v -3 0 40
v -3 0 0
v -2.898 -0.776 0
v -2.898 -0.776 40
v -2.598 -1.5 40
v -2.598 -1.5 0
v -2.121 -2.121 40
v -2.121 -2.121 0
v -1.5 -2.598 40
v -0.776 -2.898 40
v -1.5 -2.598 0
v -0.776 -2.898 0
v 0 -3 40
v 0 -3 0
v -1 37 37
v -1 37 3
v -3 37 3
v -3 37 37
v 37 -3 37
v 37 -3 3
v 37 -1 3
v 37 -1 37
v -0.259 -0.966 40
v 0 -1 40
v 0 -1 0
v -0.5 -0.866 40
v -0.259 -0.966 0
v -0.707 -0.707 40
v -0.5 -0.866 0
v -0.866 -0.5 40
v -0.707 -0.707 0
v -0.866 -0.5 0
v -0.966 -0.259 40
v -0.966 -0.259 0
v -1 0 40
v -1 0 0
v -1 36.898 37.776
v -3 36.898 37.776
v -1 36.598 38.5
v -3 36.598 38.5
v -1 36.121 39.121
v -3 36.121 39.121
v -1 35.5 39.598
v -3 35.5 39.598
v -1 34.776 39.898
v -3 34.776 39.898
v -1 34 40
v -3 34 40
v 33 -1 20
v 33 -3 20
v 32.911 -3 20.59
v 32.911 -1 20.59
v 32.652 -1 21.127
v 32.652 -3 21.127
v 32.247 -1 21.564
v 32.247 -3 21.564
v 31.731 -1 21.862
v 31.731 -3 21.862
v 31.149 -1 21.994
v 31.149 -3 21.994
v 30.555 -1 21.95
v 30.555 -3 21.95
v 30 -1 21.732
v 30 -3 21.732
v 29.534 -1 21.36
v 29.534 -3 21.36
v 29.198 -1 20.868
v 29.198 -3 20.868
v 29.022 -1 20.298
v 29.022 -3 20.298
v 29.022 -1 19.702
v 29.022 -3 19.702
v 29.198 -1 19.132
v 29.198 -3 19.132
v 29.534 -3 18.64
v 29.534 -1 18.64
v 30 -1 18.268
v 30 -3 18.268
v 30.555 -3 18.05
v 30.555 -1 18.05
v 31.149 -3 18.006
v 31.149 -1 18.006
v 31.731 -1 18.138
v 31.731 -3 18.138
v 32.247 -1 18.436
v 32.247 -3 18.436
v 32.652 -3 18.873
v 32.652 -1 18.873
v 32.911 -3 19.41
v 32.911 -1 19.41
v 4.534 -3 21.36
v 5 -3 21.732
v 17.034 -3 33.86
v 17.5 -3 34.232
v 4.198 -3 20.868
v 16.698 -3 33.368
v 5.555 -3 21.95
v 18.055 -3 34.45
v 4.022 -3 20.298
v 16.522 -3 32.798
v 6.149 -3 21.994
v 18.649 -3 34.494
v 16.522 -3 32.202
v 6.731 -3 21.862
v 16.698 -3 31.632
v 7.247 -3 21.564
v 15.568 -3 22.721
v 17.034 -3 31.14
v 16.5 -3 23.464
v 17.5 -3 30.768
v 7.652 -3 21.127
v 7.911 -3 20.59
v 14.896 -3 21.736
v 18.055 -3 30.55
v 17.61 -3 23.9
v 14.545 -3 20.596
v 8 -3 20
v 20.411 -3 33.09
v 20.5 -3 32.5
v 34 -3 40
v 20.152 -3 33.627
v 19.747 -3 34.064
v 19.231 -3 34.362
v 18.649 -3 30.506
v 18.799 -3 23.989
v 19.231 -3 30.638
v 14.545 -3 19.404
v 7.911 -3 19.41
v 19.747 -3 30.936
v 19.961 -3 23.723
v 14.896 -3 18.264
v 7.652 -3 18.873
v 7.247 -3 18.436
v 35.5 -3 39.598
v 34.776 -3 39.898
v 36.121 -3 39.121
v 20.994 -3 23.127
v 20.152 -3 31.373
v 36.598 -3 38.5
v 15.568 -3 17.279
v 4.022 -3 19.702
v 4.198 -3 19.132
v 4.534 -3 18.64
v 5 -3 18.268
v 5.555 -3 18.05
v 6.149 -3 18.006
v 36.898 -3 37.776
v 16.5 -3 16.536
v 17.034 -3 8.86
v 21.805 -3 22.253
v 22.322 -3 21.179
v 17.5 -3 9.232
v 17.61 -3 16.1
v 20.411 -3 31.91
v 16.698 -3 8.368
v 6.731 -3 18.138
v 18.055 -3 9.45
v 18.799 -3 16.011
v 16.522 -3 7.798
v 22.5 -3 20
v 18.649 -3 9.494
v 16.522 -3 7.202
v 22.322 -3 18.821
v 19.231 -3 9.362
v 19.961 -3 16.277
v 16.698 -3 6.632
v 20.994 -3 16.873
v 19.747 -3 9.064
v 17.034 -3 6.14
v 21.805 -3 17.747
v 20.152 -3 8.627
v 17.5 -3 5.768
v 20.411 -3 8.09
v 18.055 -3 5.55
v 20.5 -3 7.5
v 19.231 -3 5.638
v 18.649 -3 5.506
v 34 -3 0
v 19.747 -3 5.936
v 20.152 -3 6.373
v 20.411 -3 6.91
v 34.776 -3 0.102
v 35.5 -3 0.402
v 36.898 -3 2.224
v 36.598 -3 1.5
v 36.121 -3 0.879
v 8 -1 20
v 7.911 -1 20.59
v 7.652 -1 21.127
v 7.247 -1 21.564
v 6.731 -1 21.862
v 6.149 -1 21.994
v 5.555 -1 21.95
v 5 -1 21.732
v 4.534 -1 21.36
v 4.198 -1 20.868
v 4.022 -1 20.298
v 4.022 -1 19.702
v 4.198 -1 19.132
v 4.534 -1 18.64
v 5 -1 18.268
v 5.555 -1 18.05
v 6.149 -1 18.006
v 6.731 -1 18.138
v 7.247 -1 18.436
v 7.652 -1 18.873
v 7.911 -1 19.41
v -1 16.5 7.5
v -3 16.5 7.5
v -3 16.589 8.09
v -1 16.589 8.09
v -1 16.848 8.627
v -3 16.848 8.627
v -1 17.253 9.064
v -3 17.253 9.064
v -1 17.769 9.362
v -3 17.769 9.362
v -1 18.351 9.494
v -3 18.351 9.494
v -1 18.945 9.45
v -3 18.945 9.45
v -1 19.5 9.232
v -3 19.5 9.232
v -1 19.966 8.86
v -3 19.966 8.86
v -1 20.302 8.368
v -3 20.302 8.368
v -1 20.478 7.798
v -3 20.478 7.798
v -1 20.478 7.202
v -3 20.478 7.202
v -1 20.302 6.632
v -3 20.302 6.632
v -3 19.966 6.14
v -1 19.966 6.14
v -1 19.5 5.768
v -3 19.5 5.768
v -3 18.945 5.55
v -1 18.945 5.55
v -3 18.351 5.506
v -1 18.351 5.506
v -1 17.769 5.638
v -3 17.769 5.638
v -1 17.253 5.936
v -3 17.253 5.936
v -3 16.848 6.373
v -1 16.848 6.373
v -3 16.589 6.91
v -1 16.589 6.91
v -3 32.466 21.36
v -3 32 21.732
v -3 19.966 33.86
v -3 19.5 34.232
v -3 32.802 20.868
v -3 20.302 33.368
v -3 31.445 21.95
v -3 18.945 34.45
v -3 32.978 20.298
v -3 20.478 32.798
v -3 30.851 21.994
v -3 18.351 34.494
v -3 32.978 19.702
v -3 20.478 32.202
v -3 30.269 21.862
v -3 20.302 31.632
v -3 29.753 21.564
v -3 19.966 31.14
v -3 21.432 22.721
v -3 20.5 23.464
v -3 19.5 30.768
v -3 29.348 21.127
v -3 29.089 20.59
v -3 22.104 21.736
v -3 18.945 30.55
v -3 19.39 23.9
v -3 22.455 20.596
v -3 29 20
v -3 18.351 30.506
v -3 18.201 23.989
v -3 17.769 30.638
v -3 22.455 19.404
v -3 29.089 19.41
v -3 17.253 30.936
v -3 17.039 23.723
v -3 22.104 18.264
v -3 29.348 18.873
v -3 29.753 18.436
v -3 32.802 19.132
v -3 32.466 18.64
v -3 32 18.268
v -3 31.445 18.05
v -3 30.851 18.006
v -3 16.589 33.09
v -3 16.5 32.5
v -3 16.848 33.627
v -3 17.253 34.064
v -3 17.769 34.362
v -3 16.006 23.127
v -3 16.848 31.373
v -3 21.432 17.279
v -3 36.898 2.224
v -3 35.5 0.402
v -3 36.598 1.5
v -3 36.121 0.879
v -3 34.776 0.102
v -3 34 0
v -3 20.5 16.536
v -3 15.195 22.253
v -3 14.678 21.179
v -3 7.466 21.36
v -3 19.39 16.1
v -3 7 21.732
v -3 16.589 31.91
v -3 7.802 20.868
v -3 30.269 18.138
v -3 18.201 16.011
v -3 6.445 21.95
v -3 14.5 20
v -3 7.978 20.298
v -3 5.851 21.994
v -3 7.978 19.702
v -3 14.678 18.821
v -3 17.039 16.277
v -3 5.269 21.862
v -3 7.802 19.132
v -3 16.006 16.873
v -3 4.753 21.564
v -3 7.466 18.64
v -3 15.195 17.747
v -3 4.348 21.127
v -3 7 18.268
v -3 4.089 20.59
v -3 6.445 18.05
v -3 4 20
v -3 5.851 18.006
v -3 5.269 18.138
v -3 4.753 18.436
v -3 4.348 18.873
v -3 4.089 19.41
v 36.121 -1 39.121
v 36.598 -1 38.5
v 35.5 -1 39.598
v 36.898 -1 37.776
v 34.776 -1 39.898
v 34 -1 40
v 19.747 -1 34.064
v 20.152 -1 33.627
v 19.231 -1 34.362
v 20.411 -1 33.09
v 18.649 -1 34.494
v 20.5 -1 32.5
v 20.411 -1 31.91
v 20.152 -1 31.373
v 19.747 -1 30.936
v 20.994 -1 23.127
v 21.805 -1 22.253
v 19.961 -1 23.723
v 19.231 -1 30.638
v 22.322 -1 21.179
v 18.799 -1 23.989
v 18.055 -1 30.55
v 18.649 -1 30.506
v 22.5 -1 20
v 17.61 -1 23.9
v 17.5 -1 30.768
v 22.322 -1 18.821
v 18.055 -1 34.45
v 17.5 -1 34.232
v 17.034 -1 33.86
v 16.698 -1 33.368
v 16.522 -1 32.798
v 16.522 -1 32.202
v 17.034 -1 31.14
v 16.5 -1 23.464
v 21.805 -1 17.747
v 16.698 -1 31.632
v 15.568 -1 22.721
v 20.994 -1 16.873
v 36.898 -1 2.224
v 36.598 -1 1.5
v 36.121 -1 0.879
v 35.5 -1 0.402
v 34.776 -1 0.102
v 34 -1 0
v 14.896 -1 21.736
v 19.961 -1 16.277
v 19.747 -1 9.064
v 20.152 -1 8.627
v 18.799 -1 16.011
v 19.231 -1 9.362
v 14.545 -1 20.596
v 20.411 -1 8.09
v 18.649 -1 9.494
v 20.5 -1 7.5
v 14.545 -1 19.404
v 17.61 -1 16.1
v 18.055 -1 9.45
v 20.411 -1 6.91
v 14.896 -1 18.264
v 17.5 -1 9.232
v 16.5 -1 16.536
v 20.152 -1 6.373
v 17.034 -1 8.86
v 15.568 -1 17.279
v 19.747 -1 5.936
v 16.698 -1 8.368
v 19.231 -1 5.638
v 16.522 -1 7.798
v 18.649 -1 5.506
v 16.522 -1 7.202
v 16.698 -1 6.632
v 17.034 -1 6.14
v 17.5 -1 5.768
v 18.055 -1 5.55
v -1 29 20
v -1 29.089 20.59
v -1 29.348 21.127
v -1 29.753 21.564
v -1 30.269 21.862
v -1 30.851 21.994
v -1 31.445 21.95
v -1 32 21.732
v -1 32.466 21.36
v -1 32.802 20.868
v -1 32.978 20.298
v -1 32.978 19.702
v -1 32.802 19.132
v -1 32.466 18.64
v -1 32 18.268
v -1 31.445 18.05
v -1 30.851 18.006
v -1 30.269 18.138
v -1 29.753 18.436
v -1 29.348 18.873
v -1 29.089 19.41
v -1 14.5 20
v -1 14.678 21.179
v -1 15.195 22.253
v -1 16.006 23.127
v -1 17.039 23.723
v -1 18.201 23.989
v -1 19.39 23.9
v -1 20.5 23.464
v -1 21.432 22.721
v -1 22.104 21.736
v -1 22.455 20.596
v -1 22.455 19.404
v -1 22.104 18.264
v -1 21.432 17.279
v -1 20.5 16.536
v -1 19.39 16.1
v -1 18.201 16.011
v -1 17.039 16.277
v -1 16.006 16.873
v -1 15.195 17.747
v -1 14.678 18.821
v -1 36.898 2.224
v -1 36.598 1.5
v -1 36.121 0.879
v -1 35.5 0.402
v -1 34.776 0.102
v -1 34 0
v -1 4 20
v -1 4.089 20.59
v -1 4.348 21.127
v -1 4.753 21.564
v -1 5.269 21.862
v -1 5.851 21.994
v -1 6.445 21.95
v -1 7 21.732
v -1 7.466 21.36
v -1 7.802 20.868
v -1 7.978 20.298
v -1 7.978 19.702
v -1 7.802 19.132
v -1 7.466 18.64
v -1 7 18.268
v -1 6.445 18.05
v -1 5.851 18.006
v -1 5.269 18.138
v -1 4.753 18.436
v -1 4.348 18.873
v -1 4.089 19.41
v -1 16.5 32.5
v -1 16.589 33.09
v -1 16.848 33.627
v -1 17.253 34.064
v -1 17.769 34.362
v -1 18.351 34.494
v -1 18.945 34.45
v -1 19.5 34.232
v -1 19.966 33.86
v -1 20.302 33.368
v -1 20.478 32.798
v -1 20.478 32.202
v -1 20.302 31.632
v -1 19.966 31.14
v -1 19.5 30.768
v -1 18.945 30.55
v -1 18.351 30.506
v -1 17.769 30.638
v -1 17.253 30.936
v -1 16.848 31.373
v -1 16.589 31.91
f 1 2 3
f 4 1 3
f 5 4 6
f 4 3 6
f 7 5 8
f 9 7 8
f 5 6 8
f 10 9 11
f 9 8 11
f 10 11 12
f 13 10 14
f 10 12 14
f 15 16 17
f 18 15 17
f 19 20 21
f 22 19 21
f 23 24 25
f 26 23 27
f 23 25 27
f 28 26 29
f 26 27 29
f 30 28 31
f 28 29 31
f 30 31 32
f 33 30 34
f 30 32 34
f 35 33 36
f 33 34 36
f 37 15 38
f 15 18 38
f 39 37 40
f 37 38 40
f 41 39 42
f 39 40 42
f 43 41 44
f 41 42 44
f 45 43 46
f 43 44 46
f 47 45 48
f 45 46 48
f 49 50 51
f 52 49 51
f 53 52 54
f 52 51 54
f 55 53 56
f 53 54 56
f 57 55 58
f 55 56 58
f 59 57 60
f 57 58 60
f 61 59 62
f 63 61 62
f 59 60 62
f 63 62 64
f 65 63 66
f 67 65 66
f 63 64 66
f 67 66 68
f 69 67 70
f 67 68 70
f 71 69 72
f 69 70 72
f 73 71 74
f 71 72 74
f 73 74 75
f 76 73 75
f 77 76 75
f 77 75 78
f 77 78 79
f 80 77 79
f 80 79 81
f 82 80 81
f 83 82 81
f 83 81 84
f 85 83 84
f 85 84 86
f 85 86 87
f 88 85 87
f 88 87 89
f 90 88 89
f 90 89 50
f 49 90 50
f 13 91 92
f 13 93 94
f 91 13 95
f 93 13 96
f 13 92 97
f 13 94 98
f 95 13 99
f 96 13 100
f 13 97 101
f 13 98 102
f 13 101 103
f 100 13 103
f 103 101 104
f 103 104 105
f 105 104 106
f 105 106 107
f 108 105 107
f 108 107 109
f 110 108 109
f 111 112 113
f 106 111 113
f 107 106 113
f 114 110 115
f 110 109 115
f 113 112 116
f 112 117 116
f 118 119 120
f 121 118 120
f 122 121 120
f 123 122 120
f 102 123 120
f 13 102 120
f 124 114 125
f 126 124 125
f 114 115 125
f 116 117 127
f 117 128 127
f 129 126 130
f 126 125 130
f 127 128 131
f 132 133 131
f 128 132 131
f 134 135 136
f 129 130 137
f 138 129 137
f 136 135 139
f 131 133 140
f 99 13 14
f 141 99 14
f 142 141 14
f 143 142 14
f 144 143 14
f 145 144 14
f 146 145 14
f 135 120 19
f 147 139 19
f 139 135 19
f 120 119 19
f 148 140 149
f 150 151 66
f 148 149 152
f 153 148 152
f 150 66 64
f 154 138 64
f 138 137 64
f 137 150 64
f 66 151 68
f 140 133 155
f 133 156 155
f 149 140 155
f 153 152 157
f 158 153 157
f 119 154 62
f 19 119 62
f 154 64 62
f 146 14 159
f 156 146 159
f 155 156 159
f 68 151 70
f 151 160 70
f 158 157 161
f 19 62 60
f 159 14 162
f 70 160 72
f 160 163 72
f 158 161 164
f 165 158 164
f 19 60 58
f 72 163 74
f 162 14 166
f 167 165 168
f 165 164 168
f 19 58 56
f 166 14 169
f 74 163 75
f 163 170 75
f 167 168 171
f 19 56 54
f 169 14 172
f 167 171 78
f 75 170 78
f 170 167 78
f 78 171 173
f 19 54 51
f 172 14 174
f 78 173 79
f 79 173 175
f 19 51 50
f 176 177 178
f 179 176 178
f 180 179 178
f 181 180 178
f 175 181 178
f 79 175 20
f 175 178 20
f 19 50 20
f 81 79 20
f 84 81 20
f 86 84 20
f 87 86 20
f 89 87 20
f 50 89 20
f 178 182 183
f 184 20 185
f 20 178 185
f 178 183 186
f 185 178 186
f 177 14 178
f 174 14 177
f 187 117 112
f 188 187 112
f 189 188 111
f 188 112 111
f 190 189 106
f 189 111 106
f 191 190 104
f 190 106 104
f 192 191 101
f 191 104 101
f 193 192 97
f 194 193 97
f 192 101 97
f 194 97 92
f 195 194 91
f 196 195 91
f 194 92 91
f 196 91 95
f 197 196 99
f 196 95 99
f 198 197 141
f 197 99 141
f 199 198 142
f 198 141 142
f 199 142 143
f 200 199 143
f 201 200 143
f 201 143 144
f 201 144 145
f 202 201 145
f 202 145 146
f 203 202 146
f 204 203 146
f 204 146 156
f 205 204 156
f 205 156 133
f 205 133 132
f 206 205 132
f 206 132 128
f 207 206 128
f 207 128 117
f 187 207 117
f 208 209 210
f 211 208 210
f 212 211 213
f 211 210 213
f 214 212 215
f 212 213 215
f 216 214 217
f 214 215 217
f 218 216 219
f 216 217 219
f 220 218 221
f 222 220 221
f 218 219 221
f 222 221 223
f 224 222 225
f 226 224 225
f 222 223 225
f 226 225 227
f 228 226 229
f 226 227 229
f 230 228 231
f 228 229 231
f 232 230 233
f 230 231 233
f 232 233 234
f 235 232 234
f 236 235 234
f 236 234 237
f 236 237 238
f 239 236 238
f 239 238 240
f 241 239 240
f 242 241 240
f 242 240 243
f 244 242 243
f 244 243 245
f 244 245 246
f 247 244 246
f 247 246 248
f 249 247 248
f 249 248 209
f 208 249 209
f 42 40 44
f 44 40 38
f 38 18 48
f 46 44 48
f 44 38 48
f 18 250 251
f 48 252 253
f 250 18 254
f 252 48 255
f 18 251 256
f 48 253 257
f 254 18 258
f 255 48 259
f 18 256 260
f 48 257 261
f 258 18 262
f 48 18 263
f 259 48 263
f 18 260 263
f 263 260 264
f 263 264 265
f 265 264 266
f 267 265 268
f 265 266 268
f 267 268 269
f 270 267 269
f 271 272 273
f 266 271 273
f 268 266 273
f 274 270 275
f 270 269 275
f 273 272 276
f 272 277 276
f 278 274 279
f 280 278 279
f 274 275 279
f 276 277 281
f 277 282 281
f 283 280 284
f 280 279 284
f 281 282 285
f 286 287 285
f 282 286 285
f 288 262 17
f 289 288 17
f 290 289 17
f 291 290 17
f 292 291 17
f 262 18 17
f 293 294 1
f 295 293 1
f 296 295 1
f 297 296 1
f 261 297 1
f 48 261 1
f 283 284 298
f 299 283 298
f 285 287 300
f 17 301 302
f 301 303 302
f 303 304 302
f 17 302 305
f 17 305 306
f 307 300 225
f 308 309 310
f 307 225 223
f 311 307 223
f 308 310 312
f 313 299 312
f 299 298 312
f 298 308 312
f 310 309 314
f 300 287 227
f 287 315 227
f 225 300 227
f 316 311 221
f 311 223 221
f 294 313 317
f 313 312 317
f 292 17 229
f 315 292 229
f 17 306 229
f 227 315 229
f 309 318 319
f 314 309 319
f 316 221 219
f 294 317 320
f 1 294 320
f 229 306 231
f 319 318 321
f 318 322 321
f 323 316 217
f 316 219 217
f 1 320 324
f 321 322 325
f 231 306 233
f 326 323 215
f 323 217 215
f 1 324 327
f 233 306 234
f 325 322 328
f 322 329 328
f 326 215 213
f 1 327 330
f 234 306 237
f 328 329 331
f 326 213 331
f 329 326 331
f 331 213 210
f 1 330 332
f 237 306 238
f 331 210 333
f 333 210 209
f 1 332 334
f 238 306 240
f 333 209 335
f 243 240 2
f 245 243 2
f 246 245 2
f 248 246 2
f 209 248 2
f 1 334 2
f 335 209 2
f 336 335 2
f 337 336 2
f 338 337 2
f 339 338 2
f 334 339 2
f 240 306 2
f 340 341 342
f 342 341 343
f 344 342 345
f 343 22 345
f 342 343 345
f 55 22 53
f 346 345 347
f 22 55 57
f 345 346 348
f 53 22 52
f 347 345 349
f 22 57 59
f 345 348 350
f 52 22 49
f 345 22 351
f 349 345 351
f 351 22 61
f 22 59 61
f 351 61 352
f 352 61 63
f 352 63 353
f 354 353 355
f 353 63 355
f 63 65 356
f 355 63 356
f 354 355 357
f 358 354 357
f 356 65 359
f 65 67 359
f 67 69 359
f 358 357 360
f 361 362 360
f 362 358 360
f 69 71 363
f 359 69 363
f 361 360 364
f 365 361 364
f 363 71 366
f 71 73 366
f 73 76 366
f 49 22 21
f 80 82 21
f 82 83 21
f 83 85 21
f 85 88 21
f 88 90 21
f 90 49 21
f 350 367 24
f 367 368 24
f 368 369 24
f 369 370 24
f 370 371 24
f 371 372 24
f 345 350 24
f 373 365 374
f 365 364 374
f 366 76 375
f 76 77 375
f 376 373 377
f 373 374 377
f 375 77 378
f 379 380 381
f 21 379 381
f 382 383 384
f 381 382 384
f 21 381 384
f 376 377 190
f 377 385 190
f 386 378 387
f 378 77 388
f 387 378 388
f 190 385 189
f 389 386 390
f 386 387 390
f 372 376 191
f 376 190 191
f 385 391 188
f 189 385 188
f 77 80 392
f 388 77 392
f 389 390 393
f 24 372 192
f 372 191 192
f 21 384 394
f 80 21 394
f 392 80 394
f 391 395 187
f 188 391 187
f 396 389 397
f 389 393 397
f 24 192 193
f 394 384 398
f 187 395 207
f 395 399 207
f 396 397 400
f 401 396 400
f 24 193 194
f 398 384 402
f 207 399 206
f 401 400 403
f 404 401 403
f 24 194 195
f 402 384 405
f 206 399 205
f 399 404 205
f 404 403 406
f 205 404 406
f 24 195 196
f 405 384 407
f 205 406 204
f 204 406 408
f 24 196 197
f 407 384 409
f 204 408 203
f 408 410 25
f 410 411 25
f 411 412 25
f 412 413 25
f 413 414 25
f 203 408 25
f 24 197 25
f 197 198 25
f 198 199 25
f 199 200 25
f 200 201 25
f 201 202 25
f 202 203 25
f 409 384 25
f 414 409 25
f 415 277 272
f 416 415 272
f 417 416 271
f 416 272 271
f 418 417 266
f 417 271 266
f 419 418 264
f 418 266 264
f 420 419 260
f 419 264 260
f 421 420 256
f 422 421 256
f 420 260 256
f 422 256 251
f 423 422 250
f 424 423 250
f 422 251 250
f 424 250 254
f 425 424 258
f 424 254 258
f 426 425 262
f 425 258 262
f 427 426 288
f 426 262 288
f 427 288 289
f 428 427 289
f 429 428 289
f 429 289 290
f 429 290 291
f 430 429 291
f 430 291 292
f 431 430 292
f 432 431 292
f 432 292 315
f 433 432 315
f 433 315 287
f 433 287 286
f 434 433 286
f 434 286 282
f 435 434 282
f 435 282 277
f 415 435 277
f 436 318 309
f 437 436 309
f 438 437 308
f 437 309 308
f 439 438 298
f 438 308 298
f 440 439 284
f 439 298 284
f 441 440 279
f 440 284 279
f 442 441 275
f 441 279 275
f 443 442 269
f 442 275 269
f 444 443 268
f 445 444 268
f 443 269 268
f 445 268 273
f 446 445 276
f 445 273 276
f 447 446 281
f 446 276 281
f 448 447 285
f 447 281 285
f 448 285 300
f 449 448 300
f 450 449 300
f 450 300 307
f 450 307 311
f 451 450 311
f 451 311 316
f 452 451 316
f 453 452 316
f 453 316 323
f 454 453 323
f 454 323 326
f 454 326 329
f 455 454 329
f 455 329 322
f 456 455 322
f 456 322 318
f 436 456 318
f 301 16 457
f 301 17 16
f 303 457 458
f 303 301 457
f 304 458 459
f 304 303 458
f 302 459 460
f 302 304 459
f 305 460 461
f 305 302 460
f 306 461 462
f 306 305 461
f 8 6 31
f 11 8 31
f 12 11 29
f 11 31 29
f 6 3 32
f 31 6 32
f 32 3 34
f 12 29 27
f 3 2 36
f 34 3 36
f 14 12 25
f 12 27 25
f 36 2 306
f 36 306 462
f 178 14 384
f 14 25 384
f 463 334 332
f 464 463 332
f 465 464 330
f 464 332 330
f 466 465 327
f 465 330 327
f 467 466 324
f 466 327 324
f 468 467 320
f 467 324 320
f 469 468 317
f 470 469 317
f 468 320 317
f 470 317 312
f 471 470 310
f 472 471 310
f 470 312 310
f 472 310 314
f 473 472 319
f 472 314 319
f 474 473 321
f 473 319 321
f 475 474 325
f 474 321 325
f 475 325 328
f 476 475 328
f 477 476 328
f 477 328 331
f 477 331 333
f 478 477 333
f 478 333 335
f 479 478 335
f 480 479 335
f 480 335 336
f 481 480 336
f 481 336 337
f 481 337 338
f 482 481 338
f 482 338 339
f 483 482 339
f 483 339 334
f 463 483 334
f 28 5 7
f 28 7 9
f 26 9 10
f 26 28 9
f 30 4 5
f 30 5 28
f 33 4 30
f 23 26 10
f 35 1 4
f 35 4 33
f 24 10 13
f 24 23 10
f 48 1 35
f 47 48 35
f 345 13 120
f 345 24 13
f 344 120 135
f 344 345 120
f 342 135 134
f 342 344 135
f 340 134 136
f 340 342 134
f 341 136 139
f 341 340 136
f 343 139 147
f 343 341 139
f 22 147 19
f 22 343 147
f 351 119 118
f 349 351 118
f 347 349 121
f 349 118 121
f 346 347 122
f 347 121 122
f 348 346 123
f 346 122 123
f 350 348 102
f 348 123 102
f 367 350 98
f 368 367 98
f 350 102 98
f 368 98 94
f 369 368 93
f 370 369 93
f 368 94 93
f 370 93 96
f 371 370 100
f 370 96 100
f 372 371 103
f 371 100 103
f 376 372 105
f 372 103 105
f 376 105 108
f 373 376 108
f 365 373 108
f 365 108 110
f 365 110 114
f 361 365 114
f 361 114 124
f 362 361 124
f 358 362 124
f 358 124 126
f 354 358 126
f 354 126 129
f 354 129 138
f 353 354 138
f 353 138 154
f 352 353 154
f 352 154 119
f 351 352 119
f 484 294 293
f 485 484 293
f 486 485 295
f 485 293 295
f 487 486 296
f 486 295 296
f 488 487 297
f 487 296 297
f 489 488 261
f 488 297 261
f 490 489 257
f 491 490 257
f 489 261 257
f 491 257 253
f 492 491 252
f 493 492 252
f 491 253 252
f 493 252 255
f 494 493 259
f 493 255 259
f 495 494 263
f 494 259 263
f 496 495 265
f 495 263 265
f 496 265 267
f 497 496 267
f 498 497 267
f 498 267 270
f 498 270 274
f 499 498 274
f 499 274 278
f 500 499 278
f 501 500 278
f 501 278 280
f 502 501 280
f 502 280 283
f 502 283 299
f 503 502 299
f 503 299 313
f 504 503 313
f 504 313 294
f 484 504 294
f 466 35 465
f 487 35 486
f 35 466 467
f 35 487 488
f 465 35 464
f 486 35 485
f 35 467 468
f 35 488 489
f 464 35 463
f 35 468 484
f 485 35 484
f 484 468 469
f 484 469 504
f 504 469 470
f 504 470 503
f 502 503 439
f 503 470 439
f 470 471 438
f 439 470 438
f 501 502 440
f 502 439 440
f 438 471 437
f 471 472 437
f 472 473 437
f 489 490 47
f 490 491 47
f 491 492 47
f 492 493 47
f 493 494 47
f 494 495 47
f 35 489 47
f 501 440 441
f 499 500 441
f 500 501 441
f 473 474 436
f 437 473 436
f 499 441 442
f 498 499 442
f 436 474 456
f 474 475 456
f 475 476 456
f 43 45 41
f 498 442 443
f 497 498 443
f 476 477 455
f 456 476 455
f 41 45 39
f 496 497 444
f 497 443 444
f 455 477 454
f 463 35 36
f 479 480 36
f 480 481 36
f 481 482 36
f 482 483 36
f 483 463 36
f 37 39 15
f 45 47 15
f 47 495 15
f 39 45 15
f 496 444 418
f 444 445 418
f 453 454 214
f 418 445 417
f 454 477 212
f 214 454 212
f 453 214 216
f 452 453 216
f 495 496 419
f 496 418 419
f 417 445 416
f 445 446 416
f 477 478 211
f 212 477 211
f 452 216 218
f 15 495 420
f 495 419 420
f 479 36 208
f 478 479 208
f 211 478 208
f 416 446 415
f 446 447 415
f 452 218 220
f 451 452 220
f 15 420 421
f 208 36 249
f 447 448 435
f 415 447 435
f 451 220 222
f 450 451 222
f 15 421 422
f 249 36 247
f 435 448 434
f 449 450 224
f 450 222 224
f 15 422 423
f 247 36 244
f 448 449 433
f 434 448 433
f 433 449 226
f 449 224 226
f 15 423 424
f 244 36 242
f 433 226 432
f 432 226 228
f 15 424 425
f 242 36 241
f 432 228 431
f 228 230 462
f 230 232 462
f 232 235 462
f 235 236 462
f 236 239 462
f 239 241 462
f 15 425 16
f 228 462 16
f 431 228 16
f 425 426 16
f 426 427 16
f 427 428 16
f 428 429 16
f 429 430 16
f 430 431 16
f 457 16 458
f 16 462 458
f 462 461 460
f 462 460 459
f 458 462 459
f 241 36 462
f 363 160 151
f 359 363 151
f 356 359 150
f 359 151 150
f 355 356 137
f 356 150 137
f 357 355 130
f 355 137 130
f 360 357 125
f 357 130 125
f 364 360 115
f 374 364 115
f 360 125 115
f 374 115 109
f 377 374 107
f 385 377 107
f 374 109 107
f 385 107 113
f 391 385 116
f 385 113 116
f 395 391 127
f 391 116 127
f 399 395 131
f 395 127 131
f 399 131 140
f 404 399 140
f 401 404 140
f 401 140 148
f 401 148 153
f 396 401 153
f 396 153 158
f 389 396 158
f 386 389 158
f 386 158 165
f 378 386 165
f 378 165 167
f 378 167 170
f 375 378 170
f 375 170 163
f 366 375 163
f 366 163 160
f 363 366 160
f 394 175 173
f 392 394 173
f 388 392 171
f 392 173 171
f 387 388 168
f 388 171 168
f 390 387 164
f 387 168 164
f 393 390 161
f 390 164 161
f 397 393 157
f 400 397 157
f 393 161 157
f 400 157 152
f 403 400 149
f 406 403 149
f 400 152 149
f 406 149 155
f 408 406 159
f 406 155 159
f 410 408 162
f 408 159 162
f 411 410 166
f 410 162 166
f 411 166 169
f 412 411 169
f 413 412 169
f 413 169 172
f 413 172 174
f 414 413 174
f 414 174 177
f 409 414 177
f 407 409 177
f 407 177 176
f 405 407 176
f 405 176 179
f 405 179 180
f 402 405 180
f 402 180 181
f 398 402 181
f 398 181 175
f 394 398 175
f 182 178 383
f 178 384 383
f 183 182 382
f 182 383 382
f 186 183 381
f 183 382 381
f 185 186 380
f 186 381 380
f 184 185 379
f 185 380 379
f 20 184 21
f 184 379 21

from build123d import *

# Parameters (mm, degrees)
EXTRUDE_1_DEPTH     = 40
SKETCH_2_R          = 2
SKETCH_2_R_2        = 4
CUT_EXTRUDE_1_DEPTH = 40
SKETCH_3_R          = 2
SKETCH_3_R_2        = 4
CUT_EXTRUDE_2_DEPTH = 40
FILLET_1_R          = 3


with BuildPart() as part:
    # Эскиз1 → Бобышка-Вытянуть1 (new body)
    with BuildSketch(Plane.XY):
        with BuildLine():
            Line((-3, 37), (-3, 0))
            ThreePointArc((-3, 0), (-2.121320344, -2.121320344), (0, -3))
            Line((0, -3), (37, -3))
            Line((37, -3), (37, -1))
            Line((37, -1), (0, -1))
            ThreePointArc((0, -1), (-0.707106781, -0.707106781), (-1, 0))
            Line((-1, 0), (-1, 37))
            Line((-1, 37), (-3, 37))
        make_face()
    extrude(amount=EXTRUDE_1_DEPTH)

    # Эскиз2 → Вырез-Вытянуть1 (cut)
    with BuildSketch(Plane.ZY.offset(3)):
        with Locations(Location((7.5, 18.5, 0), (0, 0, 270))):
            Circle(SKETCH_2_R)
        with Locations(Location((20, 31, 0), (0, 0, 270))):
            Circle(SKETCH_2_R)
        with Locations(Location((20, 18.5, 0), (0, 0, 270))):
            Circle(SKETCH_2_R_2)
        with Locations(Location((32.5, 18.5, 0), (0, 0, 270))):
            Circle(SKETCH_2_R)
        with Locations(Location((20, 6, 0), (0, 0, 270))):
            Circle(SKETCH_2_R)
    extrude(amount=-CUT_EXTRUDE_1_DEPTH, mode=Mode.SUBTRACT)

    # Эскиз3 → Вырез-Вытянуть2 (cut)
    with BuildSketch(Plane.XZ.offset(3)):
        with Locations((18.5, 7.5)):
            Circle(SKETCH_3_R)
        with Locations((6, 20)):
            Circle(SKETCH_3_R)
        with Locations((18.5, 32.5)):
            Circle(SKETCH_3_R)
        with Locations((31, 20)):
            Circle(SKETCH_3_R)
        with Locations((18.5, 20)):
            Circle(SKETCH_3_R_2)
    extrude(amount=-CUT_EXTRUDE_2_DEPTH, mode=Mode.SUBTRACT)

    # Скругление1
    fillet_1_edges = [part.edges().sort_by_distance(p)[0] for p in [
        (-2, 37, 0),
        (37, -2, 40),
        (-2, 37, 40),
        (37, -2, 0),
    ]]
    fillet(fillet_1_edges, radius=FILLET_1_R)


solid = part.part
